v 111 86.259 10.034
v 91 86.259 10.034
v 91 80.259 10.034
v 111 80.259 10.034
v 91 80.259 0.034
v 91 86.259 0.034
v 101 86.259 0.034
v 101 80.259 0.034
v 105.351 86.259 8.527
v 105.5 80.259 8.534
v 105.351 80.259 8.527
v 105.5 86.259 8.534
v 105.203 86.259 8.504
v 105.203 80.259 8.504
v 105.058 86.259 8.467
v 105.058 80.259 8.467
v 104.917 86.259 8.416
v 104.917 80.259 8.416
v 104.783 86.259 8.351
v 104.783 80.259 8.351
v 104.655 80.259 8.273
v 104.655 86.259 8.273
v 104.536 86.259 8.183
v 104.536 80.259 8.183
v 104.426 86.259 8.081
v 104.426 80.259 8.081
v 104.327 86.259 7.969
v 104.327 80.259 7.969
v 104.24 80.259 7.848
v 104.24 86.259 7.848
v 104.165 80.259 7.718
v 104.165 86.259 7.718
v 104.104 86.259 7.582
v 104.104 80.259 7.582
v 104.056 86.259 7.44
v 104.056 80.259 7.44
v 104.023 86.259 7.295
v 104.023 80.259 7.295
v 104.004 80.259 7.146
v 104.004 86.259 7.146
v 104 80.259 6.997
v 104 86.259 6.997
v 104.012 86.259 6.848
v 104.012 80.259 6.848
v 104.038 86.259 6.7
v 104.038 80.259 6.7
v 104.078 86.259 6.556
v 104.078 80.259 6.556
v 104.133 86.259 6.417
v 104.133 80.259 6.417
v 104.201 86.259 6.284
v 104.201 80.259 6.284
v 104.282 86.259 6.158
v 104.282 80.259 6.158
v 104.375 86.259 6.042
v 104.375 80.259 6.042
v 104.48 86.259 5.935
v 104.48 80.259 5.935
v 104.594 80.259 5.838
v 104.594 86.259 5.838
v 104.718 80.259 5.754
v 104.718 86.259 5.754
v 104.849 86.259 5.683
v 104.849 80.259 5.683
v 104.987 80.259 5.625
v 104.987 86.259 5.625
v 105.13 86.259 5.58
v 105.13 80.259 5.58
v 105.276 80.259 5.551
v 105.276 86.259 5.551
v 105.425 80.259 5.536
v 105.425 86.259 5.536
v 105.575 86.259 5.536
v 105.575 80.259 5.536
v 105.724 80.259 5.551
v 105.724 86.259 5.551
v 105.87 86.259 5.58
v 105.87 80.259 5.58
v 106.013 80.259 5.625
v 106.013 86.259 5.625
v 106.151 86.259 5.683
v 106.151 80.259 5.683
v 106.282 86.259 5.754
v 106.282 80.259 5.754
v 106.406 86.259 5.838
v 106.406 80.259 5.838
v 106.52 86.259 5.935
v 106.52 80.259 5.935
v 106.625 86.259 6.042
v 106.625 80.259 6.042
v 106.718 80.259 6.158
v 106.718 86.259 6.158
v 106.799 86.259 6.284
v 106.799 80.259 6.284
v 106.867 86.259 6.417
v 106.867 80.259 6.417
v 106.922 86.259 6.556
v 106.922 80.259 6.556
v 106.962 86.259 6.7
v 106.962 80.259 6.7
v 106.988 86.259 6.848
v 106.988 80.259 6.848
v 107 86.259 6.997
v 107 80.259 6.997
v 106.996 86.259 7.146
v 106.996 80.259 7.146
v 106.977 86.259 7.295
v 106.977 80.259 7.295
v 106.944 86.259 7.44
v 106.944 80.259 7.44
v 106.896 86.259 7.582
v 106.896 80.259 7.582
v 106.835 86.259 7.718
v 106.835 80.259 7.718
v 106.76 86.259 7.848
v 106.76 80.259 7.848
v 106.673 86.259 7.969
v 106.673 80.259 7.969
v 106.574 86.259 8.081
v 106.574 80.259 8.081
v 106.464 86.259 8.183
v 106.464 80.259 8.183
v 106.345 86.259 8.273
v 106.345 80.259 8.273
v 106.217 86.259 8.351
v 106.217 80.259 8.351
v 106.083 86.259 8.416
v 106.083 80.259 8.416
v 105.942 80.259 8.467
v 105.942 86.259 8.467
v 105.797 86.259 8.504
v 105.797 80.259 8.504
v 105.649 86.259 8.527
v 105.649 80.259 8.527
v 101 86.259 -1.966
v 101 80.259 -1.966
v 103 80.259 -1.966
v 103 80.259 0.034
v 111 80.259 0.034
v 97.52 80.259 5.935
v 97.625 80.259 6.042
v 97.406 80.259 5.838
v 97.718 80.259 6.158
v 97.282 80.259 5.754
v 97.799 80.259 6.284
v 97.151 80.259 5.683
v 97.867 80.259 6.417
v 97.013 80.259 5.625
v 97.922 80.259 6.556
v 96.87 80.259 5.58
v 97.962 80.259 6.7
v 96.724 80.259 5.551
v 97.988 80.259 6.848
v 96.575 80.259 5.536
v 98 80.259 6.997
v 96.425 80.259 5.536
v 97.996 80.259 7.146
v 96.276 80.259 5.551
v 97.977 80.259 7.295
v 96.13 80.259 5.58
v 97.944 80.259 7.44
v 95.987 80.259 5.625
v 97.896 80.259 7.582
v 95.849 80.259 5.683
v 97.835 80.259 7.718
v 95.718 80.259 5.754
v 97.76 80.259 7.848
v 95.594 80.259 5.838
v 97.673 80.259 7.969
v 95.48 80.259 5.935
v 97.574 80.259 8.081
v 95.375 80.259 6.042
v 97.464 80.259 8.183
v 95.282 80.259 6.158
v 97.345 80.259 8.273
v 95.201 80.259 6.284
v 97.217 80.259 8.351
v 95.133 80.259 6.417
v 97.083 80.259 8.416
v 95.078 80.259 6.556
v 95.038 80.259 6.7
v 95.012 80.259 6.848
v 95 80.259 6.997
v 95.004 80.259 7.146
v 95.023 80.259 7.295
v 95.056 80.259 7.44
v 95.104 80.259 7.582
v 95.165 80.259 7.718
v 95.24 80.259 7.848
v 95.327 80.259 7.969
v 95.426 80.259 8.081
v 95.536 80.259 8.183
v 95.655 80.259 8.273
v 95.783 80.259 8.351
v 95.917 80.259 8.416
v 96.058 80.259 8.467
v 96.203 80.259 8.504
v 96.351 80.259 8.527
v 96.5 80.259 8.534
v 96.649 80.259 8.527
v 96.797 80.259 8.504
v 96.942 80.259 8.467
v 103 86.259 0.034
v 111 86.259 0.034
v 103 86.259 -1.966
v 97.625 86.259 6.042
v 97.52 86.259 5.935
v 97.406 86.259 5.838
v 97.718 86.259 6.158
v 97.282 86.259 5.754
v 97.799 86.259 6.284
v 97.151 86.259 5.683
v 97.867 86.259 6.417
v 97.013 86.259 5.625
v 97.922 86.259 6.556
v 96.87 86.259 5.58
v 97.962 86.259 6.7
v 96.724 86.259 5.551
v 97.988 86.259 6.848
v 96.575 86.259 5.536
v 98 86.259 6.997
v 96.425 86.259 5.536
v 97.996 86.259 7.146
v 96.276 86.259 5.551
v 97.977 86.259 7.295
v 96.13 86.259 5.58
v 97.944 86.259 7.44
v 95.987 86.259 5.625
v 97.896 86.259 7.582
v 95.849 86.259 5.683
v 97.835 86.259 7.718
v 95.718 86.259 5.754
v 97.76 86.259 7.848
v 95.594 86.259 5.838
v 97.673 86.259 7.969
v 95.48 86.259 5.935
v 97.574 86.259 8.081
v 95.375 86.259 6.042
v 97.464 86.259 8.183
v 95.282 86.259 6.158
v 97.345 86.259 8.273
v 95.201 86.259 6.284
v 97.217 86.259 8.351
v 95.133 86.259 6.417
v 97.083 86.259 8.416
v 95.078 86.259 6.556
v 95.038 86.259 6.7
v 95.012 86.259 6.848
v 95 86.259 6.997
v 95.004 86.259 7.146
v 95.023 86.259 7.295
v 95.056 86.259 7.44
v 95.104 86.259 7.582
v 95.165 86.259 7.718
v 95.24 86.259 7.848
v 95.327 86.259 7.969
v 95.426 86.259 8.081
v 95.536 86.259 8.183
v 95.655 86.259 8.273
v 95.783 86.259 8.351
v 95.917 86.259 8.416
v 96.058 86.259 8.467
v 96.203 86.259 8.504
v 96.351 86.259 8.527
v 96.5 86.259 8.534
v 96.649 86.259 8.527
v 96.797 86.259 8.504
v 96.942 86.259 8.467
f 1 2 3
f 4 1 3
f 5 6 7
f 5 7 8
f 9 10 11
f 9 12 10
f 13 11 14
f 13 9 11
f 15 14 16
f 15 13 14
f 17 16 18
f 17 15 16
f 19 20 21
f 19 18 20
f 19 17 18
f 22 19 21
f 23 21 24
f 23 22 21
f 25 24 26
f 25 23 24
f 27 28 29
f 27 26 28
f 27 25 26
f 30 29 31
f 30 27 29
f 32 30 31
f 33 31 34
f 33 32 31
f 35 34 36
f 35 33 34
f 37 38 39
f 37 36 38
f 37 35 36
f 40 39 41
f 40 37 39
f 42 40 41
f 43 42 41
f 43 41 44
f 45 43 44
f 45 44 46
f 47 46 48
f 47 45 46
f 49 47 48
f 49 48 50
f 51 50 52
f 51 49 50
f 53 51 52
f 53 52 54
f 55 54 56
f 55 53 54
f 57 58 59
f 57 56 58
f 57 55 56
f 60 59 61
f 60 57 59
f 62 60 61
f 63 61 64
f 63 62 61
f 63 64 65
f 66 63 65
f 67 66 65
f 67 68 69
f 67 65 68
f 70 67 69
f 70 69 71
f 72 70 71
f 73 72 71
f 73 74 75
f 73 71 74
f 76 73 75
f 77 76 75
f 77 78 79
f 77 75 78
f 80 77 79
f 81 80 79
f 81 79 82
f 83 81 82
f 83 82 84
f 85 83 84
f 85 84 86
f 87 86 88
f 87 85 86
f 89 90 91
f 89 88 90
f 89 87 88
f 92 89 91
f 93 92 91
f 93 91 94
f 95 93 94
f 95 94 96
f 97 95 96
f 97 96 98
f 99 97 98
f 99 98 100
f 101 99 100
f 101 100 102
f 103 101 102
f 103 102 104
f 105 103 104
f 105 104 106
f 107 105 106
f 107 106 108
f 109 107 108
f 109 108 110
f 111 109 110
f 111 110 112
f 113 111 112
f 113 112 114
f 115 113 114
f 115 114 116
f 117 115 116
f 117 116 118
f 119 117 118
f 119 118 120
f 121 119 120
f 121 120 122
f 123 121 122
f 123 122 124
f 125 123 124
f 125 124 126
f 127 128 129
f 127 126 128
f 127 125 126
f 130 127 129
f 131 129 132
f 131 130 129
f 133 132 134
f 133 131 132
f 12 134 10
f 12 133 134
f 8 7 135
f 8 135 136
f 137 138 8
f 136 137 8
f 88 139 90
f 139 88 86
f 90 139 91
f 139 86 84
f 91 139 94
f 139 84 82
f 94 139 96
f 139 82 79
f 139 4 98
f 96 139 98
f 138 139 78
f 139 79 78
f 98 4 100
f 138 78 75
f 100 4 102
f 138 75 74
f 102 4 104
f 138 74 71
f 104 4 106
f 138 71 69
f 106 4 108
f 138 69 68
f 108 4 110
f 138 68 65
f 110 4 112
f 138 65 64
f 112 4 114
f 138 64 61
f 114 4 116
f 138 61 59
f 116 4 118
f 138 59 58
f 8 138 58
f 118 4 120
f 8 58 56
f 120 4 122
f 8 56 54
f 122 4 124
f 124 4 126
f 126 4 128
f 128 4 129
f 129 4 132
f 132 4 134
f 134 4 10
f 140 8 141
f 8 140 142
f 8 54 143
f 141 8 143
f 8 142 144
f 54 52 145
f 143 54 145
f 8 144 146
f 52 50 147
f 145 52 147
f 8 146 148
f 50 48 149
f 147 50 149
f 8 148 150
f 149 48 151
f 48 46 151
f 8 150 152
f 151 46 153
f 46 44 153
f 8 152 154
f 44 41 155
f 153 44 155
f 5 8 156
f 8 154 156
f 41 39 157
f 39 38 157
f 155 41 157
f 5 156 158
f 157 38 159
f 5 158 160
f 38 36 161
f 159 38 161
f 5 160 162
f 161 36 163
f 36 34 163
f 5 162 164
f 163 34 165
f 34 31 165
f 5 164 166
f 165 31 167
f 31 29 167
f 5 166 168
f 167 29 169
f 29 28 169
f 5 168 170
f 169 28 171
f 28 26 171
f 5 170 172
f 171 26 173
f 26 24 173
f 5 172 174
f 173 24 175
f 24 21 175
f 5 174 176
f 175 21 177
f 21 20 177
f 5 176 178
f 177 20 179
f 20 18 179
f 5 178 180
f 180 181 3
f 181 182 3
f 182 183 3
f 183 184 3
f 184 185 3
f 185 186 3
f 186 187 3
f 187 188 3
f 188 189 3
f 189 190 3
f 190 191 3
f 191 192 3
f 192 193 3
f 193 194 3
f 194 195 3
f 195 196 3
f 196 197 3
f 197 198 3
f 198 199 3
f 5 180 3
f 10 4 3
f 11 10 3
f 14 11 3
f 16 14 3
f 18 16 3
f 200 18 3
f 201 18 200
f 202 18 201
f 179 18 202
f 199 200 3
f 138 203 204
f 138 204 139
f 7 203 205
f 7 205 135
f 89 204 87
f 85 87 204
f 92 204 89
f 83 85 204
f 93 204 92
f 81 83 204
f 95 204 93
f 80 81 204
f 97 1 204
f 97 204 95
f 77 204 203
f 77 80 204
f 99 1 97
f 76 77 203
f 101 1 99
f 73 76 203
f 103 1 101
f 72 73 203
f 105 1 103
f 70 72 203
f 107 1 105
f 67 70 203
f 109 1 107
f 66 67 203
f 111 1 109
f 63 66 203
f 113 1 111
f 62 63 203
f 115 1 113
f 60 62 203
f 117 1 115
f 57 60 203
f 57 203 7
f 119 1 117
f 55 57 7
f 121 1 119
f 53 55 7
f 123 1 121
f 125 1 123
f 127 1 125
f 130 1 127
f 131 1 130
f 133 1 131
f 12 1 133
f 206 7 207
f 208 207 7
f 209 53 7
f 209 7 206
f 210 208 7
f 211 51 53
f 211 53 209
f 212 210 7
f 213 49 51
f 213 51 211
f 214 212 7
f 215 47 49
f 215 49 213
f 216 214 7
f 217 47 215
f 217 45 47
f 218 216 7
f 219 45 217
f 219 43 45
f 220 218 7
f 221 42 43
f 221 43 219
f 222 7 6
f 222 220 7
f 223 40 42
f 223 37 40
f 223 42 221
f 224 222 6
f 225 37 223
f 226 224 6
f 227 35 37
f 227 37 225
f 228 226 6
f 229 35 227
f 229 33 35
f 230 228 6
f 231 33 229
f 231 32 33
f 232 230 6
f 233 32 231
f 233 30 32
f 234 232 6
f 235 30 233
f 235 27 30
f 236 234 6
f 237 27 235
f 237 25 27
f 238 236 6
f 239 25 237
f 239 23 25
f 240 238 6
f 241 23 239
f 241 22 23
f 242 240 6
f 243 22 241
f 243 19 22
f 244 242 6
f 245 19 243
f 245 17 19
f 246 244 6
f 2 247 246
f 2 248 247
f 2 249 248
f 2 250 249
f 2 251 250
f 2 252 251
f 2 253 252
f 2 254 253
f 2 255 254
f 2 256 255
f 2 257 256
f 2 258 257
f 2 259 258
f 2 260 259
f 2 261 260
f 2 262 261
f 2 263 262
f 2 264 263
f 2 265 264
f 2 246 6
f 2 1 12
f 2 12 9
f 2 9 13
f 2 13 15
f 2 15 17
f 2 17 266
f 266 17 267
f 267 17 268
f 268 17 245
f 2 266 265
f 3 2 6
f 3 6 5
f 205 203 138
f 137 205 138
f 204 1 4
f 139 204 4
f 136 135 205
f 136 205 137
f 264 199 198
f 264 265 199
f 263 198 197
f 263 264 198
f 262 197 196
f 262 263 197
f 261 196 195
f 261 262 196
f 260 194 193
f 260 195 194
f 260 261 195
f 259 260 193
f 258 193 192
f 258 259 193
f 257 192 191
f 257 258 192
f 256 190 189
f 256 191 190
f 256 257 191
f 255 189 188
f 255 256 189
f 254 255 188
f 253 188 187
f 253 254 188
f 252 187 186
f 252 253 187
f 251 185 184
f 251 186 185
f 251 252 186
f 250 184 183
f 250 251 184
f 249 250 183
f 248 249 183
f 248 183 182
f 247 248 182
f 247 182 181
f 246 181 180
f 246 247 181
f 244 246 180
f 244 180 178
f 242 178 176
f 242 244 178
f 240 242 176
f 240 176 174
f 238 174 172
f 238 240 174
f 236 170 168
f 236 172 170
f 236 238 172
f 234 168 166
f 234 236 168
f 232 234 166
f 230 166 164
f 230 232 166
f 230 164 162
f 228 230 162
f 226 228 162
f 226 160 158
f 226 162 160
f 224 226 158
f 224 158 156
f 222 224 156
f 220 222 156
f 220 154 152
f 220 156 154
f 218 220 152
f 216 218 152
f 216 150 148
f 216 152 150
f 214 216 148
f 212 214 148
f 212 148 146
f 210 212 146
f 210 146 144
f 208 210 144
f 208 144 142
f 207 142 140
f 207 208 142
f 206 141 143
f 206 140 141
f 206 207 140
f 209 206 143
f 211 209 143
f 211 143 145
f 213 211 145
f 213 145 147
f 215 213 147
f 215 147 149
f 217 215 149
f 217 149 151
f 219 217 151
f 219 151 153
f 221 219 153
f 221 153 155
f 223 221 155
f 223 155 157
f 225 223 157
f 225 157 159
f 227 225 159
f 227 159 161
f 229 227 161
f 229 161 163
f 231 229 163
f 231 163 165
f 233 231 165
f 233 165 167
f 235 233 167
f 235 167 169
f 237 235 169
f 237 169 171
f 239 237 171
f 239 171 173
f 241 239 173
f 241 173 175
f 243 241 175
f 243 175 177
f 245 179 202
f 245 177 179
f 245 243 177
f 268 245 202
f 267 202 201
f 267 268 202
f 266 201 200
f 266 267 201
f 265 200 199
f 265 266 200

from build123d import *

# Parameters (mm, degrees)
CYLINDER033_R           = 1.5
CYLINDER033_DEPTH       = 10
ARRAY001016_Y_COUNT     = 2
ARRAY001016_Y_PITCH     = 9
BOX016_W                = 6
BOX016_H                = 20
BOX016_DEPTH            = 10
BOX017_W                = 6
BOX017_H                = 2
BOX017_DEPTH            = 2
BODY002_ROLL_ANGLE      = 180
BODY002_PLACEMENT_ANGLE = -90


with BuildPart() as end_stop_hole_array:
    # Cylinder033 → Cylinder033 (new body)
    with BuildSketch(Plane(origin=(-2, 5.5, 3), x_dir=(0, 0, -1), z_dir=(1, 0, 0))):
        Circle(CYLINDER033_R)
    extrude(amount=CYLINDER033_DEPTH)

    # Array001016 Y: end stop hole array ×2


with BuildPart() as end_stop_hole_array_1:
    add(end_stop_hole_array.part)
    with Locations(*[(0, i * ARRAY001016_Y_PITCH, 0) for i in range(1, ARRAY001016_Y_COUNT)]):
        add(end_stop_hole_array.part)


with BuildPart() as end_stop_body_cube:
    # Box016 → Box016 (new body)
    with BuildSketch(Plane.XY):
        with Locations((3, 10)):
            Rectangle(BOX016_W, BOX016_H)
    extrude(amount=BOX016_DEPTH)


with BuildPart() as end_stop_clone001:
    # Box017 → Box017 (new body)
    with BuildSketch(Plane(origin=(0, 8, 10), x_dir=(1, 0, 0), z_dir=(0, 0, 1))):
        with Locations((3, 1)):
            Rectangle(BOX017_W, BOX017_H)
    extrude(amount=BOX017_DEPTH)

    # Fusion013: union end stop body cube
    add(end_stop_body_cube.part)

    # Cut013: cut end stop hole array
    add(end_stop_hole_array_1.part, mode=Mode.SUBTRACT)


with BuildPart() as end_stop_clone001_1:
    # Body002 roll: moved
    add(end_stop_clone001.part.rotate(Axis((0, 0, 0), (1, 0, 0)), BODY002_ROLL_ANGLE))


with BuildPart() as end_stop_clone001_2:
    # Body002 placement: moved
    add(end_stop_clone001_1.part.moved(Location((111, 86.2588, 10.0341))).rotate(Axis((111, 86.2588, 10.0341), (0, 0, 1)), BODY002_PLACEMENT_ANGLE))


solid = end_stop_clone001_2.part
